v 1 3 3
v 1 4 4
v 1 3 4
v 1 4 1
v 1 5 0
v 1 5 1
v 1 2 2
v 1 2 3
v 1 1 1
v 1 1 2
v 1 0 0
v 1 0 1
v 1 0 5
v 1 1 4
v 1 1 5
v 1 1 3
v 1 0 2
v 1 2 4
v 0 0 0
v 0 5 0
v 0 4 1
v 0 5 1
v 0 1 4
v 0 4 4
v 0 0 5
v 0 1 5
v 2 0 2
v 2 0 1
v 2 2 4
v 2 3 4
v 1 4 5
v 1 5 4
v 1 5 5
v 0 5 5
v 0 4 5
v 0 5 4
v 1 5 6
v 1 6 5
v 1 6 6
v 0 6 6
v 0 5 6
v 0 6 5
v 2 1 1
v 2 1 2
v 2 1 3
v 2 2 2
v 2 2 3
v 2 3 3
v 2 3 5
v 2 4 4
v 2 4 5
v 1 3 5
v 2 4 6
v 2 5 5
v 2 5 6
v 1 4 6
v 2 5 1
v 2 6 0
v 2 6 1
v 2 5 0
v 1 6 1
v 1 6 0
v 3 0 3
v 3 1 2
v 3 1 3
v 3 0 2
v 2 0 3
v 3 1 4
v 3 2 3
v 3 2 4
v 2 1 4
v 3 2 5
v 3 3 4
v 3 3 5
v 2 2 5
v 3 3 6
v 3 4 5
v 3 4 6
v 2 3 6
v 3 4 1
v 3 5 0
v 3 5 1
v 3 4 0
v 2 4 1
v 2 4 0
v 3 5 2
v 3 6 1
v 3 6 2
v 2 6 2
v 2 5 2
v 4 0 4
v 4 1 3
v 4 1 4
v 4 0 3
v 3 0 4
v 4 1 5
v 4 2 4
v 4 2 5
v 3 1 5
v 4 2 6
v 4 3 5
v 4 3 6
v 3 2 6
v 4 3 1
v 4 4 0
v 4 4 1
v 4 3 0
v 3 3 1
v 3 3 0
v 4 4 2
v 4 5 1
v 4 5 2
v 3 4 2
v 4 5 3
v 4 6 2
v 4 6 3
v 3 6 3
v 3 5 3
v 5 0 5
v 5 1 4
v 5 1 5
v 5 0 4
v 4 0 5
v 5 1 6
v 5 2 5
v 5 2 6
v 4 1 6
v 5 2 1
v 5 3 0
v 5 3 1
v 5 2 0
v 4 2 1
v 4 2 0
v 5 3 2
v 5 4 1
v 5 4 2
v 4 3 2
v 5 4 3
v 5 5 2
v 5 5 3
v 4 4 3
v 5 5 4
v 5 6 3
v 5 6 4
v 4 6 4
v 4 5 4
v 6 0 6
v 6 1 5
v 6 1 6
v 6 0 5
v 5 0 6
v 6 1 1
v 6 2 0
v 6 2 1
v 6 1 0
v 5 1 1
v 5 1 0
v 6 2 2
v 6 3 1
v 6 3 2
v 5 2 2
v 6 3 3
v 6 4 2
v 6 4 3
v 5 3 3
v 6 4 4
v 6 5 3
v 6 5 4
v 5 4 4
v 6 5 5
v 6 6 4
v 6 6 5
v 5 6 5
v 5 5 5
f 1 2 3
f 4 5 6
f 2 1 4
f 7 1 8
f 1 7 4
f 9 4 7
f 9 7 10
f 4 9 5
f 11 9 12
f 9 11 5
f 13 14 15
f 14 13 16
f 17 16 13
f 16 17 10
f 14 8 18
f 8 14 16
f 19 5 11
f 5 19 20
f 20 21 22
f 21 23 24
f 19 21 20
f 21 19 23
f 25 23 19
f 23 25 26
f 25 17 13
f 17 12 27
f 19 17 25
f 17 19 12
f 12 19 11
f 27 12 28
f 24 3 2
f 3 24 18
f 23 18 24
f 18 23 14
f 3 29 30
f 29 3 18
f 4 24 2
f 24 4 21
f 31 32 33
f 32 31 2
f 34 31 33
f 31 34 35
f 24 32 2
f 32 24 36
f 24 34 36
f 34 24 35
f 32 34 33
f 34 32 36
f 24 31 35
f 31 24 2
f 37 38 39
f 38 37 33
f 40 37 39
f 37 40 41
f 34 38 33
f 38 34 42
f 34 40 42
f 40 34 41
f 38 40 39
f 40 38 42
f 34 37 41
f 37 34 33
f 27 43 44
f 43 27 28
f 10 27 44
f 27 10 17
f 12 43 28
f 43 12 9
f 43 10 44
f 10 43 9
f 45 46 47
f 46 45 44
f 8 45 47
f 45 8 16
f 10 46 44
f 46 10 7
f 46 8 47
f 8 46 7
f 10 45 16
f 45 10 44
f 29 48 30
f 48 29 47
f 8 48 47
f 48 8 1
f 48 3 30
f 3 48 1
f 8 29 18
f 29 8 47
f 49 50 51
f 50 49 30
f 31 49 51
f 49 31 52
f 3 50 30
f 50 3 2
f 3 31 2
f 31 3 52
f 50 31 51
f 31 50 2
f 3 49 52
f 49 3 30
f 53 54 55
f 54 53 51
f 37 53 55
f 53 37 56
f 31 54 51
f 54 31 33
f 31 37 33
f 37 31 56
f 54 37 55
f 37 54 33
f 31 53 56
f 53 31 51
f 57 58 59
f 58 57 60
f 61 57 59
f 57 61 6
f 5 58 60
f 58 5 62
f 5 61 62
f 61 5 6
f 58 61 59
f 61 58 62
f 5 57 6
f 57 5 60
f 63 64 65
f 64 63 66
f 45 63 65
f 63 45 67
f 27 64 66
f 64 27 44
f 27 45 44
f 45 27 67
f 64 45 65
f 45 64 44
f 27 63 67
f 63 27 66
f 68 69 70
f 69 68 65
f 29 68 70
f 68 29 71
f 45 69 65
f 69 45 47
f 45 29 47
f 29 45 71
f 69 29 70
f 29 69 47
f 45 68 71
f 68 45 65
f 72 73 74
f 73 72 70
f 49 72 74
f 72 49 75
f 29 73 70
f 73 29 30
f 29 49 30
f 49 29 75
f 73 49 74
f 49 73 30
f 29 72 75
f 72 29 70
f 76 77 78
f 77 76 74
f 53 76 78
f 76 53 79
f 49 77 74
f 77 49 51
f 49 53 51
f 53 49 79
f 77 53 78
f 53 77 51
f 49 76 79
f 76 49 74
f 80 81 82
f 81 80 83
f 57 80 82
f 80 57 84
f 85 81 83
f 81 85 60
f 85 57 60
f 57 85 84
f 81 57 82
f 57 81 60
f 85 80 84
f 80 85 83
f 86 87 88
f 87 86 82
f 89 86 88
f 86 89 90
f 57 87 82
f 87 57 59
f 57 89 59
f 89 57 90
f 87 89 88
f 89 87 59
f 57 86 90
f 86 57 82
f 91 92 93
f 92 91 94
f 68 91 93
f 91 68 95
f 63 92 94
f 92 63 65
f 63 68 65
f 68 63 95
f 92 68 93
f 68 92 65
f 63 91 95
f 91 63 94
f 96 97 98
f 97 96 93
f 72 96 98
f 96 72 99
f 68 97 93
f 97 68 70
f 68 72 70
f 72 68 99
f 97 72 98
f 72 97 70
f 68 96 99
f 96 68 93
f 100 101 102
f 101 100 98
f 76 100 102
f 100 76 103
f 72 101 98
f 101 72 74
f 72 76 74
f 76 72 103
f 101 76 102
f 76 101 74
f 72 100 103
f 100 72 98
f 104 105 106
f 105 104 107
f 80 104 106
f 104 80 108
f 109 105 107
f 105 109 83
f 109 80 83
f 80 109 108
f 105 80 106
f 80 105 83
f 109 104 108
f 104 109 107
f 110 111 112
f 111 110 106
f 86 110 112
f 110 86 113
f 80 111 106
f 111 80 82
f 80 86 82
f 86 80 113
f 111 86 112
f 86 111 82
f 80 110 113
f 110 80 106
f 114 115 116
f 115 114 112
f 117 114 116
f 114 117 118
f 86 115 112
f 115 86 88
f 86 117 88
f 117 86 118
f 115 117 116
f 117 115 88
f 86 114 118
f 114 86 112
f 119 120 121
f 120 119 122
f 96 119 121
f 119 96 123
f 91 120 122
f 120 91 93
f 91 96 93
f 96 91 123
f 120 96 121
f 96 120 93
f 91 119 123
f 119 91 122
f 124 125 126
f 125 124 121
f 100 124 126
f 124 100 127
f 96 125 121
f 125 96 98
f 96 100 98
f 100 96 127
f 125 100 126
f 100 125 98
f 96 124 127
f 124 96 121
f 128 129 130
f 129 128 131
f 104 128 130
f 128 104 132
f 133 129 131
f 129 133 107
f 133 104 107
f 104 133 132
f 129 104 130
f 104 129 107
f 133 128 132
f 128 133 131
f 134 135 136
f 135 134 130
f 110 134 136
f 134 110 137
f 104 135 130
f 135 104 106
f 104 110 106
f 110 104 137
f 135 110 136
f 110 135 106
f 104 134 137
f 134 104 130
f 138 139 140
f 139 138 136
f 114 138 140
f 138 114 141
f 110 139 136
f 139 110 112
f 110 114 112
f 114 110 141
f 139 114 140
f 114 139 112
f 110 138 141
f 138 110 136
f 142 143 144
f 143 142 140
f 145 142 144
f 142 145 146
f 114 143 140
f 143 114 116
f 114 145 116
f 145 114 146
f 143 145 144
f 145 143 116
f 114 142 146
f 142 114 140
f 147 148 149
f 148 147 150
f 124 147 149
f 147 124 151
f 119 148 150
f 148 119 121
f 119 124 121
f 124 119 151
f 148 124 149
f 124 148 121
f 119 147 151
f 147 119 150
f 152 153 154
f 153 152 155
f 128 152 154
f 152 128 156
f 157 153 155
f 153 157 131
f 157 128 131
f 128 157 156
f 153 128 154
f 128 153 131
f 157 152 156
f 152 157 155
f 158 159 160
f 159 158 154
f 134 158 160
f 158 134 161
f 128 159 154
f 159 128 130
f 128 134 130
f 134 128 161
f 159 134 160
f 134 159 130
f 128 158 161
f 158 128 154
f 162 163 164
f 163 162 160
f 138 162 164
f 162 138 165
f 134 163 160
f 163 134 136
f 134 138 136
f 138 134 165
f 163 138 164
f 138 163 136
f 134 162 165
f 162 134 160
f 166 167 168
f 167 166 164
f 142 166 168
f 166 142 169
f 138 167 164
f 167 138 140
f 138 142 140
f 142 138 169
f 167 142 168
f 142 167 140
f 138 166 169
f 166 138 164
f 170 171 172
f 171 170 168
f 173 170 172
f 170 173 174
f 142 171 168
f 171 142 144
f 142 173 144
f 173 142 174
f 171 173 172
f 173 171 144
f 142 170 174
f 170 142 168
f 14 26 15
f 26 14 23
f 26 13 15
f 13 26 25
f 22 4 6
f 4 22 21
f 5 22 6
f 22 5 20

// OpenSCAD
union() {
    translate([0, 0, 0]) cube([1, 1, 1]);
    translate([0, 1, 1]) cube([1, 1, 1]);
    translate([0, 2, 2]) cube([1, 1, 1]);
    translate([0, 3, 3]) cube([1, 1, 1]);
    translate([0, 4, 4]) cube([1, 1, 1]);
    translate([0, 5, 5]) cube([1, 1, 1]);
    translate([1, 0, 1]) cube([1, 1, 1]);
    translate([1, 1, 2]) cube([1, 1, 1]);
    translate([1, 2, 3]) cube([1, 1, 1]);
    translate([1, 3, 4]) cube([1, 1, 1]);
    translate([1, 4, 5]) cube([1, 1, 1]);
    translate([1, 5, 0]) cube([1, 1, 1]);
    translate([2, 0, 2]) cube([1, 1, 1]);
    translate([2, 1, 3]) cube([1, 1, 1]);
    translate([2, 2, 4]) cube([1, 1, 1]);
    translate([2, 3, 5]) cube([1, 1, 1]);
    translate([2, 4, 0]) cube([1, 1, 1]);
    translate([2, 5, 1]) cube([1, 1, 1]);
    translate([3, 0, 3]) cube([1, 1, 1]);
    translate([3, 1, 4]) cube([1, 1, 1]);
    translate([3, 2, 5]) cube([1, 1, 1]);
    translate([3, 3, 0]) cube([1, 1, 1]);
    translate([3, 4, 1]) cube([1, 1, 1]);
    translate([3, 5, 2]) cube([1, 1, 1]);
    translate([4, 0, 4]) cube([1, 1, 1]);
    translate([4, 1, 5]) cube([1, 1, 1]);
    translate([4, 2, 0]) cube([1, 1, 1]);
    translate([4, 3, 1]) cube([1, 1, 1]);
    translate([4, 4, 2]) cube([1, 1, 1]);
    translate([4, 5, 3]) cube([1, 1, 1]);
    translate([5, 0, 5]) cube([1, 1, 1]);
    translate([5, 1, 0]) cube([1, 1, 1]);
    translate([5, 2, 1]) cube([1, 1, 1]);
    translate([5, 3, 2]) cube([1, 1, 1]);
    translate([5, 4, 3]) cube([1, 1, 1]);
    translate([5, 5, 4]) cube([1, 1, 1]);
    translate([0, 0, 1]) cube([1, 1, 1]);
    translate([0, 0, 2]) cube([1, 1, 1]);
    translate([0, 0, 3]) cube([1, 1, 1]);
    translate([0, 0, 4]) cube([1, 1, 1]);
    translate([0, 1, 0]) cube([1, 1, 1]);
    translate([0, 1, 2]) cube([1, 1, 1]);
    translate([0, 1, 3]) cube([1, 1, 1]);
    translate([0, 2, 0]) cube([1, 1, 1]);
    translate([0, 2, 1]) cube([1, 1, 1]);
    translate([0, 2, 3]) cube([1, 1, 1]);
    translate([0, 3, 0]) cube([1, 1, 1]);
    translate([0, 3, 1]) cube([1, 1, 1]);
    translate([0, 3, 2]) cube([1, 1, 1]);
    translate([0, 4, 0]) cube([1, 1, 1]);
}
